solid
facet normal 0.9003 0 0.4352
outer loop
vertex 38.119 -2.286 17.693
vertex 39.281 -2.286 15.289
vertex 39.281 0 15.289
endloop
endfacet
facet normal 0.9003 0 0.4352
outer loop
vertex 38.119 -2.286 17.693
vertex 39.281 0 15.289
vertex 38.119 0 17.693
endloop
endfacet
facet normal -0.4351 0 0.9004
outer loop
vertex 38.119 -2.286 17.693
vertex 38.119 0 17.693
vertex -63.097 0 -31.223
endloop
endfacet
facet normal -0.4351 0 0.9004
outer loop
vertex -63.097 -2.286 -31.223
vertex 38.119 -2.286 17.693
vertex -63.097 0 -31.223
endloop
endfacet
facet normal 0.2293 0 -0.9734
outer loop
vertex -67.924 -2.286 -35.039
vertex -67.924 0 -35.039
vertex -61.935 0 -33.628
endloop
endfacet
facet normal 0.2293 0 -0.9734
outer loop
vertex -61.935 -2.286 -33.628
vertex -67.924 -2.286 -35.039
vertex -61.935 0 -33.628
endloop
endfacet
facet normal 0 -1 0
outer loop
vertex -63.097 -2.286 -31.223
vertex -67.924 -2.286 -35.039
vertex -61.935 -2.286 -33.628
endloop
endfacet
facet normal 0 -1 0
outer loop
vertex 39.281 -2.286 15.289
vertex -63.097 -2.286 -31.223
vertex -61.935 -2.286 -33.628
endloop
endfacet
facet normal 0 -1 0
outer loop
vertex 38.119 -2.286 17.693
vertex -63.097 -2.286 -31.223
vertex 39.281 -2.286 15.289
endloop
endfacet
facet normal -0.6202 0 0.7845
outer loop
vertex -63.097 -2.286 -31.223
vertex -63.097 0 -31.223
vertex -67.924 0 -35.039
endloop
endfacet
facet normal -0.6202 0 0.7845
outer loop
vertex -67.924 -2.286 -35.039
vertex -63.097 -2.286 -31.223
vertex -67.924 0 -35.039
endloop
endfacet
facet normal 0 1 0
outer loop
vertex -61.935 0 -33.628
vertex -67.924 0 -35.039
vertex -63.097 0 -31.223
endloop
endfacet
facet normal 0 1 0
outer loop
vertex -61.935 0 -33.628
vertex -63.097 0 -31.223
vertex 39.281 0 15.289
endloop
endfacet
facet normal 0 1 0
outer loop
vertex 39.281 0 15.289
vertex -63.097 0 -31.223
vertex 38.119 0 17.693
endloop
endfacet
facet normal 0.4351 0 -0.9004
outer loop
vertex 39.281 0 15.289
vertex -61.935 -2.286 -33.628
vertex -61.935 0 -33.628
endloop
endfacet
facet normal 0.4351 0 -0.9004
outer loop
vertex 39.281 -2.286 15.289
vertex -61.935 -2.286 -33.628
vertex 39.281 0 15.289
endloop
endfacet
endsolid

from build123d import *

# Parameters (mm, degrees)
F1_DEPTH = 2.286
F2_DEPTH = 2.286


with BuildPart() as f1:
    # F0 (on Front) → F1 (new body)
    with BuildSketch(Plane.XZ):
        Polygon((39.280557, 15.288984), (38.11859, 17.693268), (-63.09732, -31.223414), (-67.924149, -35.039101), (-61.935353, -33.627699), align=None)
    extrude(amount=F1_DEPTH)

    # F1_face (on face) → F2 (join)
    with BuildSketch(Plane(origin=(-13.27206, -2.286, -8.626268), x_dir=(1, 0, 0), z_dir=(0, -1, 0))):
        Polygon((-48.663293, -25.001431), (52.552618, 23.915252), (51.39065, 26.319536), (-49.82526, -22.597146), (-54.652089, -26.412833), align=None)
    extrude(amount=-F2_DEPTH)


solid = f1.part
